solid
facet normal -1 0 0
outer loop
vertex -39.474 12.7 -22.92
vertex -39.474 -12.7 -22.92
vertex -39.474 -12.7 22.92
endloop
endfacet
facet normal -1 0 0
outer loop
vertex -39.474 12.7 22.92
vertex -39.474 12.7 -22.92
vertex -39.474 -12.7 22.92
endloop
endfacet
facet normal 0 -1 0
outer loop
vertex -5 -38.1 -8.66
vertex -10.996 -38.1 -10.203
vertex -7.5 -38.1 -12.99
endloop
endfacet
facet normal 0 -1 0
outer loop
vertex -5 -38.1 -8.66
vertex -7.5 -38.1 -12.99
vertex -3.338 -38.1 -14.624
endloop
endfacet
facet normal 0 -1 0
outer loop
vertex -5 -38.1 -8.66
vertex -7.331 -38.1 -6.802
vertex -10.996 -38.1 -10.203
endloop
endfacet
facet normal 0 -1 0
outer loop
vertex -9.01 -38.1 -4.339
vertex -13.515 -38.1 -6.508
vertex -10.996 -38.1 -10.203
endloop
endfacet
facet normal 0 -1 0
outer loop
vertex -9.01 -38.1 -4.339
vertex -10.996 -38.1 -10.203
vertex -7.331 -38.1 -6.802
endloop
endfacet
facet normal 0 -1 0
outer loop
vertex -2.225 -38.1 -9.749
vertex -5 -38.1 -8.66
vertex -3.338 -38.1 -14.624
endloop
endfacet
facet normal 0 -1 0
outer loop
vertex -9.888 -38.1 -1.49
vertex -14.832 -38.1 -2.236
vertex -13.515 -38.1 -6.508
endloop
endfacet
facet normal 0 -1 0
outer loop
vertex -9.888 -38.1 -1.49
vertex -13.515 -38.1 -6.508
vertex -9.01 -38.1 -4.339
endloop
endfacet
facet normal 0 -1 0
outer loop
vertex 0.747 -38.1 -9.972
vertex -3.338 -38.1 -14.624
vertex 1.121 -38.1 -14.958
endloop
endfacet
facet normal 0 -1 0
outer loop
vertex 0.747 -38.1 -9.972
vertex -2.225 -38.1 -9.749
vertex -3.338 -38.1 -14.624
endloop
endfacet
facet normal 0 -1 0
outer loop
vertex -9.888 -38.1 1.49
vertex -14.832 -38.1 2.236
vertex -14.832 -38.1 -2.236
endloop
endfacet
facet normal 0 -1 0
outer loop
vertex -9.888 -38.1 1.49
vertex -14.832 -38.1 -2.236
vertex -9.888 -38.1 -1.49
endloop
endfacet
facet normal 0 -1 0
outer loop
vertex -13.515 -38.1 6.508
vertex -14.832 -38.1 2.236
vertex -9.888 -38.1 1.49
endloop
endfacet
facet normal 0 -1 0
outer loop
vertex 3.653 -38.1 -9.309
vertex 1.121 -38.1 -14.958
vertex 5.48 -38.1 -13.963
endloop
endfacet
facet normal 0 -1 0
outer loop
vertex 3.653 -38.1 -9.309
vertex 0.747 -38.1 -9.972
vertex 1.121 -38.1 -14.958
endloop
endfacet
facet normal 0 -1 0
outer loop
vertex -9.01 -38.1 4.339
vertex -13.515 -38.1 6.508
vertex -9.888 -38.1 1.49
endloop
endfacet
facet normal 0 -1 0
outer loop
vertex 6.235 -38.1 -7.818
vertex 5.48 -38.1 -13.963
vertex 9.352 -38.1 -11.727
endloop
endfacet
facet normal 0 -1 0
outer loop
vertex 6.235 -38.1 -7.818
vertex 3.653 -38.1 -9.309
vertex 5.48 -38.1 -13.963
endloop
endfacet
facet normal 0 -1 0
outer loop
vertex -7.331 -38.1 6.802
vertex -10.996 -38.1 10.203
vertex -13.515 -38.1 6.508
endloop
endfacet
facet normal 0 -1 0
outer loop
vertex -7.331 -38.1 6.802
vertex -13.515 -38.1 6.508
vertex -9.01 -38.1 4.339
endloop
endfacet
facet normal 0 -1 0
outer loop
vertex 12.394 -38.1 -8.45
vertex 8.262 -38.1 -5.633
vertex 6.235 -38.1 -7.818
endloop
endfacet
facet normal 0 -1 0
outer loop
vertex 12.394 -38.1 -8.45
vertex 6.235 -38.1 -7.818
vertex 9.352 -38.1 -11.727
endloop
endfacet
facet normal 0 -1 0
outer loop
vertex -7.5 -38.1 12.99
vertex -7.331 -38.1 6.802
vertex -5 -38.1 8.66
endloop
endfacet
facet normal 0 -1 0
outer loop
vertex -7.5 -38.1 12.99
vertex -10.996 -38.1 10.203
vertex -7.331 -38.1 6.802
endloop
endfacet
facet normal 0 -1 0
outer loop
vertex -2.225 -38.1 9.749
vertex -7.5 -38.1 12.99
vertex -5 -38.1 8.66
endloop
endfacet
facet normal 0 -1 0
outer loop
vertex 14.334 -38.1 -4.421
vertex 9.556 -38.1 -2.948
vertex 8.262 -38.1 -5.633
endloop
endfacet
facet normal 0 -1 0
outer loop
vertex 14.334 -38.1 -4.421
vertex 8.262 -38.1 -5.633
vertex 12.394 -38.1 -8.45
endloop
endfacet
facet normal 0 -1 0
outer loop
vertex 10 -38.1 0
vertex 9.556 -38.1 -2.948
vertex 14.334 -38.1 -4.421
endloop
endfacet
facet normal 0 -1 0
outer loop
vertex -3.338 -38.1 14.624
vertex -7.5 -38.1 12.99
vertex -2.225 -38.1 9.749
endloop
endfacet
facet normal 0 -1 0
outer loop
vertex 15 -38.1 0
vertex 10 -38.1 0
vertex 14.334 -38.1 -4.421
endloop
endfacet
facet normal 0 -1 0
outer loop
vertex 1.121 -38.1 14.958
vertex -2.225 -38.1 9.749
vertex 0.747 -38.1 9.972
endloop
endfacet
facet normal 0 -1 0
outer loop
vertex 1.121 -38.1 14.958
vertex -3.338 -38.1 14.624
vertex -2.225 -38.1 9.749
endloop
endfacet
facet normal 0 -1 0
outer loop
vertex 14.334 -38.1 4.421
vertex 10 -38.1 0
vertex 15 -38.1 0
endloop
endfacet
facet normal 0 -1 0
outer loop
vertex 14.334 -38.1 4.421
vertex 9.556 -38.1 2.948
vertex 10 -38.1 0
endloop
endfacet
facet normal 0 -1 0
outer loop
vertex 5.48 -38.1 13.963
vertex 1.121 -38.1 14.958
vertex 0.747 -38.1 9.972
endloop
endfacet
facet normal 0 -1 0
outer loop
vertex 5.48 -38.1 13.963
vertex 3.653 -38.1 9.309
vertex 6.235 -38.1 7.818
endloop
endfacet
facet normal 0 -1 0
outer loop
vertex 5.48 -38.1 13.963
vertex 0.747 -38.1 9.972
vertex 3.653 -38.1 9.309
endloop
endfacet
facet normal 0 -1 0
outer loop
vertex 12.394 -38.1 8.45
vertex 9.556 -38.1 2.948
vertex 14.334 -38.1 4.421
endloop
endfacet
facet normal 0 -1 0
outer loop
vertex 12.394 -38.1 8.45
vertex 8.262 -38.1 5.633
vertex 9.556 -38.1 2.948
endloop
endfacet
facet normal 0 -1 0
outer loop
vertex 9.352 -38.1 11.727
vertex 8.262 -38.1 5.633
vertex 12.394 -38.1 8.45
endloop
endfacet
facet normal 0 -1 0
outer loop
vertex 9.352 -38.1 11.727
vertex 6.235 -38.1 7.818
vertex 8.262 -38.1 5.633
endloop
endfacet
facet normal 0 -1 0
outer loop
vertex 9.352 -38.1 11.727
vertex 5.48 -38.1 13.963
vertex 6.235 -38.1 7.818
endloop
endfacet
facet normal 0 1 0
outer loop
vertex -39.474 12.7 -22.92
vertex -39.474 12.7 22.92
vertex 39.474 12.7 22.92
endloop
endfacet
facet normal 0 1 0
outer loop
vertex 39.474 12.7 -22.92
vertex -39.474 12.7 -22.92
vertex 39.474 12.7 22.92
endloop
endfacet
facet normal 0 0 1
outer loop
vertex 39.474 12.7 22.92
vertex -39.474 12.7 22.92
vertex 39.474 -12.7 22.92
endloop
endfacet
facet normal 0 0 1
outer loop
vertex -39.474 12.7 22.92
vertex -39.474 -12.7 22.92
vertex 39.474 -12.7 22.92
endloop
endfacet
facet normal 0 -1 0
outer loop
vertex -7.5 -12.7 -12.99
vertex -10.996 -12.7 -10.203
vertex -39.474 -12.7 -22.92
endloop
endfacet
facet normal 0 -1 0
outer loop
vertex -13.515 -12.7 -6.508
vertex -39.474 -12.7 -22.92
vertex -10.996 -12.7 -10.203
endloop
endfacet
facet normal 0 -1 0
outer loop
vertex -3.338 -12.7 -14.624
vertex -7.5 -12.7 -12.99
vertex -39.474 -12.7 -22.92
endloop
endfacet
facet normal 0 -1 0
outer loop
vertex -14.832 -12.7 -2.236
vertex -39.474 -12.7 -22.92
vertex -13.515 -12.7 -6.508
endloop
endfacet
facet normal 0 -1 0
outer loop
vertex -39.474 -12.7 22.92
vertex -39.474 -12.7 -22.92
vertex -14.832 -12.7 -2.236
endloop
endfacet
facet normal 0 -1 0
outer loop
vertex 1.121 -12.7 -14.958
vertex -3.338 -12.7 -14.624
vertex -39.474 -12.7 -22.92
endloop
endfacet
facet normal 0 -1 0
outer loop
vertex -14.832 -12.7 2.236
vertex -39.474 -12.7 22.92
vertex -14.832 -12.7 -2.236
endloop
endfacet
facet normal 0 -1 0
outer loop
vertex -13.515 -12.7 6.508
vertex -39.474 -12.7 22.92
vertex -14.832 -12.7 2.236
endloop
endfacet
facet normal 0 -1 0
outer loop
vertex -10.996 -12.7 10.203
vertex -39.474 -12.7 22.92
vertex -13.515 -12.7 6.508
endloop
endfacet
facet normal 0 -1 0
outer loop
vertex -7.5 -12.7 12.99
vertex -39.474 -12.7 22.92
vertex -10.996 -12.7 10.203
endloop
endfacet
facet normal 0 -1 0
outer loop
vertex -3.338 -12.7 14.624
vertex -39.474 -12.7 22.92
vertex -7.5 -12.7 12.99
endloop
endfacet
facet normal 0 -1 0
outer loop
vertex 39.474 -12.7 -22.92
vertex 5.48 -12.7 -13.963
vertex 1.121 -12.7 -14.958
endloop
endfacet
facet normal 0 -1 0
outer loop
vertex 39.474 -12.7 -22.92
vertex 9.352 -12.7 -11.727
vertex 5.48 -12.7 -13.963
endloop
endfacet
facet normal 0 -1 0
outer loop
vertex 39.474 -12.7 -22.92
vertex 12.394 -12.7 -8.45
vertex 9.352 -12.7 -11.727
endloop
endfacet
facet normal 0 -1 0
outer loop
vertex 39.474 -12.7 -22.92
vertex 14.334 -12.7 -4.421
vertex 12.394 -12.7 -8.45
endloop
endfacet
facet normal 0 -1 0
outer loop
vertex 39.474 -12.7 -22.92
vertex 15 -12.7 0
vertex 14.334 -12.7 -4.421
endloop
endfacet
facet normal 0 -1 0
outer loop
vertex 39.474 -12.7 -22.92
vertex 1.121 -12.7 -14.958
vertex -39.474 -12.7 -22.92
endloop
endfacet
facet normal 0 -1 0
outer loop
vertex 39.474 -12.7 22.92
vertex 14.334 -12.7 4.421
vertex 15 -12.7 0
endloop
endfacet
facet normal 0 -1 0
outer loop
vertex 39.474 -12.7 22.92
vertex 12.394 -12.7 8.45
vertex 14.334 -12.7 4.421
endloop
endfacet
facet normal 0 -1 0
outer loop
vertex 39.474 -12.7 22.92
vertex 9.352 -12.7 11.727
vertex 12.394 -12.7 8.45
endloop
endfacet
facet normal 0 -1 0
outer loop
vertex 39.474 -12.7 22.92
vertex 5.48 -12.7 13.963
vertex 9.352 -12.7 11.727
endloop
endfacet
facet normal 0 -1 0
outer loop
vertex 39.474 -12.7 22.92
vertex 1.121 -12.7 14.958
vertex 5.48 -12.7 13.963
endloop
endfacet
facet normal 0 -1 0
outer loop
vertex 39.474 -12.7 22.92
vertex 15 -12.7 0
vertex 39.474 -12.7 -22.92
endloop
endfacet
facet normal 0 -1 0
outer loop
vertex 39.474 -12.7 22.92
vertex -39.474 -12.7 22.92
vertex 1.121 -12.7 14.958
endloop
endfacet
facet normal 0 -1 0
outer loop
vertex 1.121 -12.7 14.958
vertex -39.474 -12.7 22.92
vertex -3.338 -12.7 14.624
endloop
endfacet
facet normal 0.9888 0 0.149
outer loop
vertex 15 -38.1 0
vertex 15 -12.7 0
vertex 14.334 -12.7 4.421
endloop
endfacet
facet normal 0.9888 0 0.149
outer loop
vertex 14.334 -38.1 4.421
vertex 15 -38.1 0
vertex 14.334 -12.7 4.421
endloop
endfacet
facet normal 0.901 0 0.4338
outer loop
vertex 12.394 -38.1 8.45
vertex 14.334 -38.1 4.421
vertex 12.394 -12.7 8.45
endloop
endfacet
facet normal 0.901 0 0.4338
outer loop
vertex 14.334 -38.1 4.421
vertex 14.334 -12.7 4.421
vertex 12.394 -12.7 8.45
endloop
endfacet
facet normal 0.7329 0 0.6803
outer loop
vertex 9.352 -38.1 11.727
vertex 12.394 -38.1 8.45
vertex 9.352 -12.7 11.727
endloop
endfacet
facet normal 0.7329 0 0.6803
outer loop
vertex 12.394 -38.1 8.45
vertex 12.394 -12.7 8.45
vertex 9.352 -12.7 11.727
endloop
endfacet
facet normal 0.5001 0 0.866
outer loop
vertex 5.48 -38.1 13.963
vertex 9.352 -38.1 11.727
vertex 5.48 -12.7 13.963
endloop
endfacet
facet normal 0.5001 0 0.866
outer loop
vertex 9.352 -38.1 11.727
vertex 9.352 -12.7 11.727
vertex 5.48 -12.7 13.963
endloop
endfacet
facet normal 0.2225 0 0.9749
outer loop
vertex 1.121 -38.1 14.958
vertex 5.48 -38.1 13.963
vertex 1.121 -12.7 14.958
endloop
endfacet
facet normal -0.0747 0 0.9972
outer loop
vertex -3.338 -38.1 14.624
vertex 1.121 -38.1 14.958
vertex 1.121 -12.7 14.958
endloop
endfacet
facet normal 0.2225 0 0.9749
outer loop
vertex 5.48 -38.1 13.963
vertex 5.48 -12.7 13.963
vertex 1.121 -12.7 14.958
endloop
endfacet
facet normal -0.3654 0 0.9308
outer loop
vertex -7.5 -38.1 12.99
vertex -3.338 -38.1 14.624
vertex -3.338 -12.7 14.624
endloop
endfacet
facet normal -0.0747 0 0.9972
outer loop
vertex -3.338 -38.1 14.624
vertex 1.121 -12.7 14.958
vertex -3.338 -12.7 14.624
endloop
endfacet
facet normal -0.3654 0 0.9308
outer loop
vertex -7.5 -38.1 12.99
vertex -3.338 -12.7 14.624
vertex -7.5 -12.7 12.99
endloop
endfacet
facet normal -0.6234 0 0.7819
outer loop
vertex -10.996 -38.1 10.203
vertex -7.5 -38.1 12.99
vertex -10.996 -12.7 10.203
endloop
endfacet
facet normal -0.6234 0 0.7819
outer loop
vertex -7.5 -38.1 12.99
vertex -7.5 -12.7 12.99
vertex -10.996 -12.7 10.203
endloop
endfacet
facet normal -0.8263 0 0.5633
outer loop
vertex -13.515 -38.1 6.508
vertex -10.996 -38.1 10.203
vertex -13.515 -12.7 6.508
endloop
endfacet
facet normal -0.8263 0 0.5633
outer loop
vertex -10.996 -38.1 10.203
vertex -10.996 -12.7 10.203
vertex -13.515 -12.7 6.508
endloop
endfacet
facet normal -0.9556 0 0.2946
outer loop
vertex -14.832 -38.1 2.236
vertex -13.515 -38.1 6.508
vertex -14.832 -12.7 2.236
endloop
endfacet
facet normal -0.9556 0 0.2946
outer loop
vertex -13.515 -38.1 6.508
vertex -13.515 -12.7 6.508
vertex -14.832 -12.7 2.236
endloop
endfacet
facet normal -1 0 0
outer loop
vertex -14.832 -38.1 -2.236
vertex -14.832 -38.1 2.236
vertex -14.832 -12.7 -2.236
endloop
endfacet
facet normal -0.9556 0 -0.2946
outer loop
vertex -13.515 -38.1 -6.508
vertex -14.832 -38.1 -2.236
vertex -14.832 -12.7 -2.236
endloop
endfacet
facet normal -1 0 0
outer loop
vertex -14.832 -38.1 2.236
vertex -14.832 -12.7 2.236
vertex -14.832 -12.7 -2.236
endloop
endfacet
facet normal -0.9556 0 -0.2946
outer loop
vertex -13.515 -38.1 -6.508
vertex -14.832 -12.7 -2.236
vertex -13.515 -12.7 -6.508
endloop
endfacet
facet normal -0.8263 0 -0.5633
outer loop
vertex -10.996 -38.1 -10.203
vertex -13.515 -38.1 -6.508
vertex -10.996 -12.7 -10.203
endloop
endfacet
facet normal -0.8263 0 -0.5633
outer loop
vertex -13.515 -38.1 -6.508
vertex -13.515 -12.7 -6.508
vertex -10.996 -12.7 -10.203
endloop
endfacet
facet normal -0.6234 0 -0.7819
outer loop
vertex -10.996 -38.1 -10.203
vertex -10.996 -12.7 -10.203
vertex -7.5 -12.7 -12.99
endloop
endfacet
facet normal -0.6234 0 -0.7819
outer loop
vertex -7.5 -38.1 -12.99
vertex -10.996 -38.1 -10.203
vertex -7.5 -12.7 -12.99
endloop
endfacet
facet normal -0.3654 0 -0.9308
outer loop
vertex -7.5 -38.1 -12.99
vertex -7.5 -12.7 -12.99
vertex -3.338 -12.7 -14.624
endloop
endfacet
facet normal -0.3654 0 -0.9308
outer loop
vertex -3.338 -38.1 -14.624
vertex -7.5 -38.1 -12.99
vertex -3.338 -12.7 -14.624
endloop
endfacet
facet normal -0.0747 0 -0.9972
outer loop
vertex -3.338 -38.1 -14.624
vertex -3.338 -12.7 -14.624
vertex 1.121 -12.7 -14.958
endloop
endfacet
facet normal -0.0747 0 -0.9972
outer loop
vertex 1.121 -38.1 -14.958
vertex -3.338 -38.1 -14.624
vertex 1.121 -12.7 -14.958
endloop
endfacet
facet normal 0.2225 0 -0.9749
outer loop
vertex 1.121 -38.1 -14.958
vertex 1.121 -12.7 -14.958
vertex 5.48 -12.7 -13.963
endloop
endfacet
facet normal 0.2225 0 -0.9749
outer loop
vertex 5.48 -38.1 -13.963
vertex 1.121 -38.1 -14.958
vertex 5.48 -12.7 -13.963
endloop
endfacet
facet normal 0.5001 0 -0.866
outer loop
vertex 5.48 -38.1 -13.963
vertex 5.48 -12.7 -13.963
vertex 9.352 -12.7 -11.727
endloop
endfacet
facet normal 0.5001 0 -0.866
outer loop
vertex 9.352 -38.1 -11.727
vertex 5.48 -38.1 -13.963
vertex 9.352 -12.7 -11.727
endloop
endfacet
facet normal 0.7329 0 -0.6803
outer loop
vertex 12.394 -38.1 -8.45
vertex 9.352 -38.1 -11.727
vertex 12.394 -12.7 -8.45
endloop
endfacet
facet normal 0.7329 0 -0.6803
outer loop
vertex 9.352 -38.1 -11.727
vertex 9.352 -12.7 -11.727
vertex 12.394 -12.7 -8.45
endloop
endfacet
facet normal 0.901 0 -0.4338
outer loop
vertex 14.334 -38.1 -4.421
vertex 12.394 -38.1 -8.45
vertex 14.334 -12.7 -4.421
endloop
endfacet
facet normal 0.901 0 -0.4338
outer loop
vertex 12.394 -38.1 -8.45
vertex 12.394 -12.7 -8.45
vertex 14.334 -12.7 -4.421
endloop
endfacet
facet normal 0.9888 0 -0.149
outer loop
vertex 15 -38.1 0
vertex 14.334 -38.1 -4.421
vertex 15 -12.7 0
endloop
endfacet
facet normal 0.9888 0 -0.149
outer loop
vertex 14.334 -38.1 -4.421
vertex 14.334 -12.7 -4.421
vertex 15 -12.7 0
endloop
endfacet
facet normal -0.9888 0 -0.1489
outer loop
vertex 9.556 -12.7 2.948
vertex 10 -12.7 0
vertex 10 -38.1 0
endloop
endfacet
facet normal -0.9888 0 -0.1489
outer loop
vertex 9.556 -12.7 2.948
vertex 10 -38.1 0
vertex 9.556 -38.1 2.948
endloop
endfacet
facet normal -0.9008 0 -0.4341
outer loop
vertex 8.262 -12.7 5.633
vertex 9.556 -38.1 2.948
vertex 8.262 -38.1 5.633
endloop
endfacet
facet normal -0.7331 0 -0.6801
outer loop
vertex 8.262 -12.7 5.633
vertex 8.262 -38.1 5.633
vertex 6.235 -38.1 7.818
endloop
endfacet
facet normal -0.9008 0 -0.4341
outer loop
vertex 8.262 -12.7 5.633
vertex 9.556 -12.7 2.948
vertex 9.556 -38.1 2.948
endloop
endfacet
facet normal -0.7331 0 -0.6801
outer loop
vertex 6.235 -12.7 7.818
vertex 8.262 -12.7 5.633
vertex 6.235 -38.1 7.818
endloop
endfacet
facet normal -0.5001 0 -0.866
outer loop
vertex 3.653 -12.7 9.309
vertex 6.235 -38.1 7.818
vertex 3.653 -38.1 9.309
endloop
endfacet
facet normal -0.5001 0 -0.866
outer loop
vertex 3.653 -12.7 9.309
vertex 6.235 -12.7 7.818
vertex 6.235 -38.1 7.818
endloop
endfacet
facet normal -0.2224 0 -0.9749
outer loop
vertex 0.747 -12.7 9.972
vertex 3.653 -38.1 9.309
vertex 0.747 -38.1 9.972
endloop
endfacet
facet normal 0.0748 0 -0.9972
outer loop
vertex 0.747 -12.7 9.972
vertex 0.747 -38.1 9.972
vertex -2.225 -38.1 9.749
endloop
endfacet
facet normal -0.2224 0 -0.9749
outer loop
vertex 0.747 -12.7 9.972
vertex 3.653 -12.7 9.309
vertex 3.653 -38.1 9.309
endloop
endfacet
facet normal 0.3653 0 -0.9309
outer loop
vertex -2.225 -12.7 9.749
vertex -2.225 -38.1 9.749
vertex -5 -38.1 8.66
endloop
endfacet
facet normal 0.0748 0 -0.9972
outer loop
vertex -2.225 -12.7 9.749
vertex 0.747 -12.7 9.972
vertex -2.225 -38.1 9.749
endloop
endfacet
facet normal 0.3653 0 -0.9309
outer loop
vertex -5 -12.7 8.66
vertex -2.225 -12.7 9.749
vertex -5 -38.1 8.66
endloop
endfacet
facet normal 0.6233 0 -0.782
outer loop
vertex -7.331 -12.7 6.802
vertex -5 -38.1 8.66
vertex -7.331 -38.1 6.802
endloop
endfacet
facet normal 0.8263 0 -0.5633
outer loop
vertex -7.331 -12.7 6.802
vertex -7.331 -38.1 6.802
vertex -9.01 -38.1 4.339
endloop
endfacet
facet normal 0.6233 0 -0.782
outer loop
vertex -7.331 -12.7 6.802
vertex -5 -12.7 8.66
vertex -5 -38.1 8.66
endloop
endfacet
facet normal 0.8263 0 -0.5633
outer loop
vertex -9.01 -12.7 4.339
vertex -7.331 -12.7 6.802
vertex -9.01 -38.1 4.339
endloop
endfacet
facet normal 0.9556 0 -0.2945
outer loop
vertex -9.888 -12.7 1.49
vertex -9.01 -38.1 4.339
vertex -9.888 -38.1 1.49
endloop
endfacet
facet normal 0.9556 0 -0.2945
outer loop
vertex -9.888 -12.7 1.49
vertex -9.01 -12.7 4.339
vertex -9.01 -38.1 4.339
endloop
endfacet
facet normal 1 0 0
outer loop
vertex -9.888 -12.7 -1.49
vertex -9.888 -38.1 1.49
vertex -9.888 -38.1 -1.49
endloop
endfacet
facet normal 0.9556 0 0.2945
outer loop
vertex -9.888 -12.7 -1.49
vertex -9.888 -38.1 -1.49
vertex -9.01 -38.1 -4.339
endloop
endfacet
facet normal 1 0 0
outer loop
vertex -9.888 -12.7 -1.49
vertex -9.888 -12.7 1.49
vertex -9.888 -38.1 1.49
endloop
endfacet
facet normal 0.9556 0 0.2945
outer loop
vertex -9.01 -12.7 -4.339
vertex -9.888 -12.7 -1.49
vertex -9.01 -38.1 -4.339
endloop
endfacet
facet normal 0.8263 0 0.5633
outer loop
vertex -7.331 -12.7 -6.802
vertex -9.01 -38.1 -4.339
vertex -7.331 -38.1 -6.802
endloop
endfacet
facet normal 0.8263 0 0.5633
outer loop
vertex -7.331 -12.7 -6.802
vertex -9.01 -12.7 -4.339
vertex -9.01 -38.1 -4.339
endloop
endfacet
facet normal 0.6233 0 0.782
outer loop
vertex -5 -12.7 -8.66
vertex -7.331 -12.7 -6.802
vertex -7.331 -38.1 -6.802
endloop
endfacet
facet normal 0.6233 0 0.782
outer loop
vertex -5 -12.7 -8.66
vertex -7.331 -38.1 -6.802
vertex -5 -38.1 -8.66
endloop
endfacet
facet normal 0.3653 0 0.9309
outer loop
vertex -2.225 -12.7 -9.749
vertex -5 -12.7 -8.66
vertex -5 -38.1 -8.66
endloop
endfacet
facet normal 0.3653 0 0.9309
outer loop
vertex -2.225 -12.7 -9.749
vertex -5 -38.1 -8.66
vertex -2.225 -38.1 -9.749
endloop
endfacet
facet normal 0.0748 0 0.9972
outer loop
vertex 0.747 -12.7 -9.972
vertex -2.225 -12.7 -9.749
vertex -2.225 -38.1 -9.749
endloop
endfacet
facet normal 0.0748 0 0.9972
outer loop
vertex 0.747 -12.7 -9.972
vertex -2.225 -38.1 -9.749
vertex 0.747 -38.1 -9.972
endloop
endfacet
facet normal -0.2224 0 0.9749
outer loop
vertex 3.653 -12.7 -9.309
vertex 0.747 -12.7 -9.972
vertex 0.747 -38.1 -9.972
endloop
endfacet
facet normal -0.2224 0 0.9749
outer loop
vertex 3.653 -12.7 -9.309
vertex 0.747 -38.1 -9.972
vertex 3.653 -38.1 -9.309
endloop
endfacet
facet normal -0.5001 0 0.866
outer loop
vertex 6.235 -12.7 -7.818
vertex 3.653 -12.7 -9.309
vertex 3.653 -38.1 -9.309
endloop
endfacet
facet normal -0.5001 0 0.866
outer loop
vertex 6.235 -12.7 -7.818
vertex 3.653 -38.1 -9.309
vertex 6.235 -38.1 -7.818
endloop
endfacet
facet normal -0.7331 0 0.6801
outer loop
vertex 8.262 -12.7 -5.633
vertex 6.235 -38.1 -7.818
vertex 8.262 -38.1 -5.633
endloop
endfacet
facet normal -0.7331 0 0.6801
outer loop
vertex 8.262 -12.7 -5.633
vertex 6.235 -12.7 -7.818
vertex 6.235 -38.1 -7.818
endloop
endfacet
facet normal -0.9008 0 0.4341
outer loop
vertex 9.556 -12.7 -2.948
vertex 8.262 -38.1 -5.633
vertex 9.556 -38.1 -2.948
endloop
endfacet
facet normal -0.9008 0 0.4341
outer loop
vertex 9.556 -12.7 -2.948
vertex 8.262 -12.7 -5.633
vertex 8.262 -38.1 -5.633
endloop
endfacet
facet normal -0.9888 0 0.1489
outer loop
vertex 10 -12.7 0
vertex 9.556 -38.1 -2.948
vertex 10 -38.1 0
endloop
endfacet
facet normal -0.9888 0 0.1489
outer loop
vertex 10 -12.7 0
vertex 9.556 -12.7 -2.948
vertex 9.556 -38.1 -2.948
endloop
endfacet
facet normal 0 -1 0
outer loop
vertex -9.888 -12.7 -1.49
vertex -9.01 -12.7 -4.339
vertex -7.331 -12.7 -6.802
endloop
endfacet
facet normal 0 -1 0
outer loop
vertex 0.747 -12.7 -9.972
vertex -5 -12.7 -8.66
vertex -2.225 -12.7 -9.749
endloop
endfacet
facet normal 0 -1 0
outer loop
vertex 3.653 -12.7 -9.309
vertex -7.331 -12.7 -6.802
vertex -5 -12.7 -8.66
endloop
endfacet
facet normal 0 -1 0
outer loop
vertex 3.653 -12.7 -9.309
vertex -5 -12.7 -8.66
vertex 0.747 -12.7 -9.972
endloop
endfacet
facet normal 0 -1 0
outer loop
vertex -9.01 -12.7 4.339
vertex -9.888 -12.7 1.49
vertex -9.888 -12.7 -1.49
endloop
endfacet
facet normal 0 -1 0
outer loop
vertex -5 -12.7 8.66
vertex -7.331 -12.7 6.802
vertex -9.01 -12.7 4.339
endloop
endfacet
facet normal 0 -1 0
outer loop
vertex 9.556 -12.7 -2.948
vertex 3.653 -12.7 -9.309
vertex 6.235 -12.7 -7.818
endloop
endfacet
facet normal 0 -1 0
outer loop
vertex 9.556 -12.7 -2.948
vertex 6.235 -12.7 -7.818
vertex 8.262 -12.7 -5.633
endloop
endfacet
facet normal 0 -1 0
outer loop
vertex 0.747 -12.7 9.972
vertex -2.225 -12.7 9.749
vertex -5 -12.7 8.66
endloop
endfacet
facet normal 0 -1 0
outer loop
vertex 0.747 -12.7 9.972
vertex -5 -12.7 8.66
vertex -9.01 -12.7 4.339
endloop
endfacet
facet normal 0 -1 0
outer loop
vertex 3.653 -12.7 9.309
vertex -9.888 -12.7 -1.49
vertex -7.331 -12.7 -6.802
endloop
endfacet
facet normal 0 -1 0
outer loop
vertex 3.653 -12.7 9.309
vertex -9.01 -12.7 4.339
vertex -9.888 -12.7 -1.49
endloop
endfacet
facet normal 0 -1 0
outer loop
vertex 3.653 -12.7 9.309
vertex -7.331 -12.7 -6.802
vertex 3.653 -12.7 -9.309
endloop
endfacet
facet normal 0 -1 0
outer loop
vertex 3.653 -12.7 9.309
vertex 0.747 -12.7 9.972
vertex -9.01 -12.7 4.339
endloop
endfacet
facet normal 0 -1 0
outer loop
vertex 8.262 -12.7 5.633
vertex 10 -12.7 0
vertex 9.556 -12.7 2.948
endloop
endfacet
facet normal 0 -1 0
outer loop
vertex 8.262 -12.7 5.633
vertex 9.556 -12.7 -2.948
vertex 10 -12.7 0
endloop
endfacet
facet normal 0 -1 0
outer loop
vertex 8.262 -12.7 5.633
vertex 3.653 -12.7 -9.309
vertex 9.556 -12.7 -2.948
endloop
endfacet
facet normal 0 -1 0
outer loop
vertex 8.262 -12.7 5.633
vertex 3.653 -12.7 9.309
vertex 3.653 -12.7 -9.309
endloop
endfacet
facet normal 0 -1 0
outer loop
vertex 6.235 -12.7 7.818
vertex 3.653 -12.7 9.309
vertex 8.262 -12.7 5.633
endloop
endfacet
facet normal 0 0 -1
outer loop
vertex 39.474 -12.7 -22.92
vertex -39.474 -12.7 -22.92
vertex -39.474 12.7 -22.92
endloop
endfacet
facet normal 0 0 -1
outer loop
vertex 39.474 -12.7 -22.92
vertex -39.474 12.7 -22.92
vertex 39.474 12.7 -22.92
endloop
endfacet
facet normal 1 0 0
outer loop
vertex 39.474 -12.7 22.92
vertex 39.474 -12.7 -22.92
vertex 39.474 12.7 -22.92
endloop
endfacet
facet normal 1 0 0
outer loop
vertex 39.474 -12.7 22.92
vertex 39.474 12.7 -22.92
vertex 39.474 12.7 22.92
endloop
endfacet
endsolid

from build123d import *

# Parameters (mm, degrees)
F0_W     = 78.947164
F0_H     = 45.840274
F1_DEPTH = 12.7
F2_R     = 15
F2_R_2   = 10
F3_DEPTH = 25.4


with BuildPart() as f1:
    # F0 (on Front) → F1 (new body, symmetric)
    with BuildSketch(Plane.XZ):
        Rectangle(F0_W, F0_H)
    extrude(amount=F1_DEPTH, both=True)

    # F2 (on face) → F3 (join)
    with BuildSketch(Plane.XZ.offset(12.7)):
        Circle(F2_R)
        Circle(F2_R_2, mode=Mode.SUBTRACT)
    extrude(amount=F3_DEPTH)


solid = f1.part
